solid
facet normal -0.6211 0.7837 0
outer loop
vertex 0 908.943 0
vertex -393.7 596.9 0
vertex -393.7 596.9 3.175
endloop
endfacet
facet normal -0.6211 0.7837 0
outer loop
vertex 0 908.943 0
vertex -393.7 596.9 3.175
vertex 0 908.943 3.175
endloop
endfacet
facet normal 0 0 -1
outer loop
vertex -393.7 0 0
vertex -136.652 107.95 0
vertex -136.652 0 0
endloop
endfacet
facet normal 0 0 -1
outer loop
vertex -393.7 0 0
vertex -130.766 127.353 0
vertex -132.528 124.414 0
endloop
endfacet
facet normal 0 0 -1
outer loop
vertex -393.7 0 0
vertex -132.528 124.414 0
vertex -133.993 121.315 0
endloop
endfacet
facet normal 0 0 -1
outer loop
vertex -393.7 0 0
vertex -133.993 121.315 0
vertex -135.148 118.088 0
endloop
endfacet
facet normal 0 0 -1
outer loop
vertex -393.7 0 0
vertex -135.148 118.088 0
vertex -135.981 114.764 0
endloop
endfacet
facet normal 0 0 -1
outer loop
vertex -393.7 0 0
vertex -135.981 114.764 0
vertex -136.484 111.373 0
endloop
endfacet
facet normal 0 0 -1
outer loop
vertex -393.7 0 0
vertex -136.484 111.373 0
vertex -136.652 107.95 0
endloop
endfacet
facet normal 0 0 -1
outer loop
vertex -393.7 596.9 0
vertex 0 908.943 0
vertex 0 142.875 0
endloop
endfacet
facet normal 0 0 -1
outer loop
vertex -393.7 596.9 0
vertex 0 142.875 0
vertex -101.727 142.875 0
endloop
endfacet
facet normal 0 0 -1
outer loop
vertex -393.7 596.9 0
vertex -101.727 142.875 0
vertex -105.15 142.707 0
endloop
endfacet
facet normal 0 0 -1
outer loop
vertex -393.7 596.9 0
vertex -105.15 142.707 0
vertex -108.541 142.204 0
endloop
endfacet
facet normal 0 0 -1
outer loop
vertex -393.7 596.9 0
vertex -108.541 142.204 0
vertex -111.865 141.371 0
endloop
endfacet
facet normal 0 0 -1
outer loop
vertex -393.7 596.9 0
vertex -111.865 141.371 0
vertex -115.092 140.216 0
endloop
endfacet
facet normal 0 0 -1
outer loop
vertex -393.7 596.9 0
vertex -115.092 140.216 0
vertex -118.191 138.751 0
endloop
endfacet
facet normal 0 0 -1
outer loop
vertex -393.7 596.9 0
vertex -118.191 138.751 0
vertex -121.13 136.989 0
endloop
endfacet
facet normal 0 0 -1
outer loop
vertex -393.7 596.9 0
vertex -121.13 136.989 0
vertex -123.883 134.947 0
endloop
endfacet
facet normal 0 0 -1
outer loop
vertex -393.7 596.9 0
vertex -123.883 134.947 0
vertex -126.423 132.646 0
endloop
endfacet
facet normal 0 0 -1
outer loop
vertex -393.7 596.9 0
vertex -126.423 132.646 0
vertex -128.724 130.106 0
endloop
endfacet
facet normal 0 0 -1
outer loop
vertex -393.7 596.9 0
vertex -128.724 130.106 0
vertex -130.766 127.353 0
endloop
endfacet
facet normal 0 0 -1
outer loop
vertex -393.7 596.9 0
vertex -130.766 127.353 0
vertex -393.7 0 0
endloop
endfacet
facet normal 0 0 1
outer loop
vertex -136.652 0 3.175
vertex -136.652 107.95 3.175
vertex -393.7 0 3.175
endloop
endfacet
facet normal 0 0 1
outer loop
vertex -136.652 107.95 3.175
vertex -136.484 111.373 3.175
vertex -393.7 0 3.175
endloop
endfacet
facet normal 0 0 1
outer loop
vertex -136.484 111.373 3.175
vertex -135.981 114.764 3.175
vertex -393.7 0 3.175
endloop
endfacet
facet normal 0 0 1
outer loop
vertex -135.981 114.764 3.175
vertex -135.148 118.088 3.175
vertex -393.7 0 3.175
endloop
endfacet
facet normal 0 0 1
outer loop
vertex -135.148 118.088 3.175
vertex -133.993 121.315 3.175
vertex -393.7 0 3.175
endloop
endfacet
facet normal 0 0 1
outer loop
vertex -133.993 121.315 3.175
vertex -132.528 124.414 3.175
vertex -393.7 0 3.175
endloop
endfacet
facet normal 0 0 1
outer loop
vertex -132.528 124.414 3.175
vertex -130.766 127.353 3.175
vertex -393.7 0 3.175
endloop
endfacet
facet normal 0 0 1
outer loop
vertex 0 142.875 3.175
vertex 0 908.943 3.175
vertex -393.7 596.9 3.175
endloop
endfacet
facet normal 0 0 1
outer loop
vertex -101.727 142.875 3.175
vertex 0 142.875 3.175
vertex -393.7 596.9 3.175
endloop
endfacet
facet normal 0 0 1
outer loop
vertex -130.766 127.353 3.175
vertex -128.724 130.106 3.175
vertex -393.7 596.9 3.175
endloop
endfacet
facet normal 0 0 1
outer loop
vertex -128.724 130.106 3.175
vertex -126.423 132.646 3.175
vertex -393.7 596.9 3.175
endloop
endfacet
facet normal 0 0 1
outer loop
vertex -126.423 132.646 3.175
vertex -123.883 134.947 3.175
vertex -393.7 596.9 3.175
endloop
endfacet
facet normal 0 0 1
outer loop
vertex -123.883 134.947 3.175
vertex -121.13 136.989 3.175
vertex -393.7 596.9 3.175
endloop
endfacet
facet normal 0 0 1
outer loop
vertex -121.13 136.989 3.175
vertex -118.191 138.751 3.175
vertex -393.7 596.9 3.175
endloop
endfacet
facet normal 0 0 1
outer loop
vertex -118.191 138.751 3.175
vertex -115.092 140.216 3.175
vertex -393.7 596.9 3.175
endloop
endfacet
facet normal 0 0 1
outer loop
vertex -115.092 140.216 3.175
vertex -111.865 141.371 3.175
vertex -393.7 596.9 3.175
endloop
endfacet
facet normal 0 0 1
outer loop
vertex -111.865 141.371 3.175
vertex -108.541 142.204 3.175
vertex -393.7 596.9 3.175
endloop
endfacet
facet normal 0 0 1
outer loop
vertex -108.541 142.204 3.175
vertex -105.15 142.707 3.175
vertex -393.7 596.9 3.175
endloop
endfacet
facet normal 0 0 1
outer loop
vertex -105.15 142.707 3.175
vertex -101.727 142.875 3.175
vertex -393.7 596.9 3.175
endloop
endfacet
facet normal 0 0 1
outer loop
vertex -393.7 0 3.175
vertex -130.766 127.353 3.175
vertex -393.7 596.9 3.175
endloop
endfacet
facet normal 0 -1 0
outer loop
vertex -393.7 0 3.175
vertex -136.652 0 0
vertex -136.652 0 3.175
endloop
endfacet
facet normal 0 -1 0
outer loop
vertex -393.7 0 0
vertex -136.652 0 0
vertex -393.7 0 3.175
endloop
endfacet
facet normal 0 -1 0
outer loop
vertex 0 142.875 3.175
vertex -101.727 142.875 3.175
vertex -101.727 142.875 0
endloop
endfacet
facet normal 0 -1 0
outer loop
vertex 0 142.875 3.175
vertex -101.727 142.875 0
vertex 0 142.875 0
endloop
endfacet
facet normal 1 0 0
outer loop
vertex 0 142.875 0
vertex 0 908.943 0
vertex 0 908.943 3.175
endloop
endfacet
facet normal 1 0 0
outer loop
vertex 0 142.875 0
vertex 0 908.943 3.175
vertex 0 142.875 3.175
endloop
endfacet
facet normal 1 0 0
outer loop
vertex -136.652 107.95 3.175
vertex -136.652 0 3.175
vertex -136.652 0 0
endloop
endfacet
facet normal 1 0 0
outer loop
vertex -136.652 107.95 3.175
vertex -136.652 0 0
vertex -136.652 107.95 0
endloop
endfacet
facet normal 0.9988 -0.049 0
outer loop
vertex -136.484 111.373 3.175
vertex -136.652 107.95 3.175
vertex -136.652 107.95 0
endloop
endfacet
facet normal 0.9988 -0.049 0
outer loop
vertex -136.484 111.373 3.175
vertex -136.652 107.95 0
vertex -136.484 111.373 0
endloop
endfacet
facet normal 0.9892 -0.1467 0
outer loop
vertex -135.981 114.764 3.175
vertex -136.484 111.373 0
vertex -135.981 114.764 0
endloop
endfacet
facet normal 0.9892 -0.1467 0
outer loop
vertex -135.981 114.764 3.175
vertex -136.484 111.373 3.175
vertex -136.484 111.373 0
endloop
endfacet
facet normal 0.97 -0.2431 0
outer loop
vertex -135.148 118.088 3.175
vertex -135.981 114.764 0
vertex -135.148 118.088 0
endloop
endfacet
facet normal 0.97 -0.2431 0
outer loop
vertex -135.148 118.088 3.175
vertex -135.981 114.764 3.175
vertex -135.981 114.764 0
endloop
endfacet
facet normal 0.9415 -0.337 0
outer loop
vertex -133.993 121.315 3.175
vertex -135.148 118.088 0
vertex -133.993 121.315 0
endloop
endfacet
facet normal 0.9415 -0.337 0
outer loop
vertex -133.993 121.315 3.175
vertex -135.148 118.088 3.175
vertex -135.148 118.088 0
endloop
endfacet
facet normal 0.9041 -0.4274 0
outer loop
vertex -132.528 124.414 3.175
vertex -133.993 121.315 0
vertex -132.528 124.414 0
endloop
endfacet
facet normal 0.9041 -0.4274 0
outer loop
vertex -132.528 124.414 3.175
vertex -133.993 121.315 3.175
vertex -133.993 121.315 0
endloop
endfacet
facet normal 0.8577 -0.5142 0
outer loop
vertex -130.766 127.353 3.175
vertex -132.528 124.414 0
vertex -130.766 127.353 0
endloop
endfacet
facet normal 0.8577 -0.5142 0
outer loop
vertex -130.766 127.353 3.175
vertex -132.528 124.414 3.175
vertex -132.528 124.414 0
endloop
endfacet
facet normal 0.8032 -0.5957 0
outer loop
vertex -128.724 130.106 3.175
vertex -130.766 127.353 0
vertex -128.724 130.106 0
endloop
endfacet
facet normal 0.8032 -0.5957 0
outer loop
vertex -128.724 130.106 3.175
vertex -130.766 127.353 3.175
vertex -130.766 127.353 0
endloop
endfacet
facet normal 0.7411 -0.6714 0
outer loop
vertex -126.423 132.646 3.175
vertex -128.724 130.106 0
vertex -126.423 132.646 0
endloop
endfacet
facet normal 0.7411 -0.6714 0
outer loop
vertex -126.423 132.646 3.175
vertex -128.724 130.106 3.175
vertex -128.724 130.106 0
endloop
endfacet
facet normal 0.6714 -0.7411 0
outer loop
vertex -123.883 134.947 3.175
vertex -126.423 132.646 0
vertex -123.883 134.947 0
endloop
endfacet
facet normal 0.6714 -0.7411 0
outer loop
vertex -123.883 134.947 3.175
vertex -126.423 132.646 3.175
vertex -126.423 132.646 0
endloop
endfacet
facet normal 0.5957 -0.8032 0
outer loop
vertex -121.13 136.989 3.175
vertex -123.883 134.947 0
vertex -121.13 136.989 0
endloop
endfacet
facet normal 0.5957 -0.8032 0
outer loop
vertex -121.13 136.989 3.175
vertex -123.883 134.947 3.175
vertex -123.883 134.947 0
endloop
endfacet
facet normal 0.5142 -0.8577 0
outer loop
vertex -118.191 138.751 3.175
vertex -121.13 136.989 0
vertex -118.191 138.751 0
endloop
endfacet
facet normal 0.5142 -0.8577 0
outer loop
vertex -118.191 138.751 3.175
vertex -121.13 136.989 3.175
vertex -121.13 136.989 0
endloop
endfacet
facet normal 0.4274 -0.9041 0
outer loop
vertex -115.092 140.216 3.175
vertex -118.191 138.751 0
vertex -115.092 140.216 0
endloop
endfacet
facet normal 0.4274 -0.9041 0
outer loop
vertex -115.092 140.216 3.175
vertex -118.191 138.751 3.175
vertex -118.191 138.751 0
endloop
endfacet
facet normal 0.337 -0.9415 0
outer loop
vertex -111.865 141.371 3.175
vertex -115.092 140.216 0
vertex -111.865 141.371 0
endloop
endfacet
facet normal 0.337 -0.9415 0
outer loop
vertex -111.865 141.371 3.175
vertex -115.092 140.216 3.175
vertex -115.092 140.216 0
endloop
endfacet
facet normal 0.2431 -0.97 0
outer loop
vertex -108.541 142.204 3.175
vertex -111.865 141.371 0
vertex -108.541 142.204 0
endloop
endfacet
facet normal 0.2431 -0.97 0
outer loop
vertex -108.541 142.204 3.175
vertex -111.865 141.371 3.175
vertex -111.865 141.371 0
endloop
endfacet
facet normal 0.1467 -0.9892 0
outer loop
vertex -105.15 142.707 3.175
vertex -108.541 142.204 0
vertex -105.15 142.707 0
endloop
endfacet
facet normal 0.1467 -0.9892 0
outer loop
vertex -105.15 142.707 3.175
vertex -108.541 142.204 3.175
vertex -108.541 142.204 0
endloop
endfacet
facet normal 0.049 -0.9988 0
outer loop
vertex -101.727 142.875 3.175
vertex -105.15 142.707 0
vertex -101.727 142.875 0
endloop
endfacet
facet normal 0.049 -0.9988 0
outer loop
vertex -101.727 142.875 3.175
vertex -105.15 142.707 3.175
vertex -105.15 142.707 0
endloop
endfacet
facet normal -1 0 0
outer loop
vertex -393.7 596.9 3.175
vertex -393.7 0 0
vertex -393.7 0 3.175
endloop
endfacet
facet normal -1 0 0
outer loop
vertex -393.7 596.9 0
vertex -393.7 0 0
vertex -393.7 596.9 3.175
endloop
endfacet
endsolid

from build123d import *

# Parameters (mm, degrees)
BOSS_EXTRUDE1_DEPTH = 3.175
CUT_EXTRUDE3_DEPTH  = 4.175


with BuildPart() as part:
    # Sketch1 → Boss-Extrude1 (new body)
    with BuildSketch(Plane.XY):
        Polygon((0, 0), (-393.7, 0), (-393.7, 596.9), (0, 908.942774901), align=None)
    extrude(amount=BOSS_EXTRUDE1_DEPTH)

    # Sketch4 → Cut-Extrude3 (cut, through all)
    with BuildSketch(Plane.XY.offset(3.175)):
        with BuildLine():
            Line((0, 0), (-136.652, 0))
            Line((-136.652, 0), (-136.652, 107.95))
            ThreePointArc((-136.652, 107.95), (-126.422704333, 132.645704333), (-101.727, 142.875))
            Line((-101.727, 142.875), (0, 142.875))
            Line((0, 142.875), (0, 0))
        make_face()
    extrude(amount=-CUT_EXTRUDE3_DEPTH, mode=Mode.SUBTRACT)


solid = part.part
